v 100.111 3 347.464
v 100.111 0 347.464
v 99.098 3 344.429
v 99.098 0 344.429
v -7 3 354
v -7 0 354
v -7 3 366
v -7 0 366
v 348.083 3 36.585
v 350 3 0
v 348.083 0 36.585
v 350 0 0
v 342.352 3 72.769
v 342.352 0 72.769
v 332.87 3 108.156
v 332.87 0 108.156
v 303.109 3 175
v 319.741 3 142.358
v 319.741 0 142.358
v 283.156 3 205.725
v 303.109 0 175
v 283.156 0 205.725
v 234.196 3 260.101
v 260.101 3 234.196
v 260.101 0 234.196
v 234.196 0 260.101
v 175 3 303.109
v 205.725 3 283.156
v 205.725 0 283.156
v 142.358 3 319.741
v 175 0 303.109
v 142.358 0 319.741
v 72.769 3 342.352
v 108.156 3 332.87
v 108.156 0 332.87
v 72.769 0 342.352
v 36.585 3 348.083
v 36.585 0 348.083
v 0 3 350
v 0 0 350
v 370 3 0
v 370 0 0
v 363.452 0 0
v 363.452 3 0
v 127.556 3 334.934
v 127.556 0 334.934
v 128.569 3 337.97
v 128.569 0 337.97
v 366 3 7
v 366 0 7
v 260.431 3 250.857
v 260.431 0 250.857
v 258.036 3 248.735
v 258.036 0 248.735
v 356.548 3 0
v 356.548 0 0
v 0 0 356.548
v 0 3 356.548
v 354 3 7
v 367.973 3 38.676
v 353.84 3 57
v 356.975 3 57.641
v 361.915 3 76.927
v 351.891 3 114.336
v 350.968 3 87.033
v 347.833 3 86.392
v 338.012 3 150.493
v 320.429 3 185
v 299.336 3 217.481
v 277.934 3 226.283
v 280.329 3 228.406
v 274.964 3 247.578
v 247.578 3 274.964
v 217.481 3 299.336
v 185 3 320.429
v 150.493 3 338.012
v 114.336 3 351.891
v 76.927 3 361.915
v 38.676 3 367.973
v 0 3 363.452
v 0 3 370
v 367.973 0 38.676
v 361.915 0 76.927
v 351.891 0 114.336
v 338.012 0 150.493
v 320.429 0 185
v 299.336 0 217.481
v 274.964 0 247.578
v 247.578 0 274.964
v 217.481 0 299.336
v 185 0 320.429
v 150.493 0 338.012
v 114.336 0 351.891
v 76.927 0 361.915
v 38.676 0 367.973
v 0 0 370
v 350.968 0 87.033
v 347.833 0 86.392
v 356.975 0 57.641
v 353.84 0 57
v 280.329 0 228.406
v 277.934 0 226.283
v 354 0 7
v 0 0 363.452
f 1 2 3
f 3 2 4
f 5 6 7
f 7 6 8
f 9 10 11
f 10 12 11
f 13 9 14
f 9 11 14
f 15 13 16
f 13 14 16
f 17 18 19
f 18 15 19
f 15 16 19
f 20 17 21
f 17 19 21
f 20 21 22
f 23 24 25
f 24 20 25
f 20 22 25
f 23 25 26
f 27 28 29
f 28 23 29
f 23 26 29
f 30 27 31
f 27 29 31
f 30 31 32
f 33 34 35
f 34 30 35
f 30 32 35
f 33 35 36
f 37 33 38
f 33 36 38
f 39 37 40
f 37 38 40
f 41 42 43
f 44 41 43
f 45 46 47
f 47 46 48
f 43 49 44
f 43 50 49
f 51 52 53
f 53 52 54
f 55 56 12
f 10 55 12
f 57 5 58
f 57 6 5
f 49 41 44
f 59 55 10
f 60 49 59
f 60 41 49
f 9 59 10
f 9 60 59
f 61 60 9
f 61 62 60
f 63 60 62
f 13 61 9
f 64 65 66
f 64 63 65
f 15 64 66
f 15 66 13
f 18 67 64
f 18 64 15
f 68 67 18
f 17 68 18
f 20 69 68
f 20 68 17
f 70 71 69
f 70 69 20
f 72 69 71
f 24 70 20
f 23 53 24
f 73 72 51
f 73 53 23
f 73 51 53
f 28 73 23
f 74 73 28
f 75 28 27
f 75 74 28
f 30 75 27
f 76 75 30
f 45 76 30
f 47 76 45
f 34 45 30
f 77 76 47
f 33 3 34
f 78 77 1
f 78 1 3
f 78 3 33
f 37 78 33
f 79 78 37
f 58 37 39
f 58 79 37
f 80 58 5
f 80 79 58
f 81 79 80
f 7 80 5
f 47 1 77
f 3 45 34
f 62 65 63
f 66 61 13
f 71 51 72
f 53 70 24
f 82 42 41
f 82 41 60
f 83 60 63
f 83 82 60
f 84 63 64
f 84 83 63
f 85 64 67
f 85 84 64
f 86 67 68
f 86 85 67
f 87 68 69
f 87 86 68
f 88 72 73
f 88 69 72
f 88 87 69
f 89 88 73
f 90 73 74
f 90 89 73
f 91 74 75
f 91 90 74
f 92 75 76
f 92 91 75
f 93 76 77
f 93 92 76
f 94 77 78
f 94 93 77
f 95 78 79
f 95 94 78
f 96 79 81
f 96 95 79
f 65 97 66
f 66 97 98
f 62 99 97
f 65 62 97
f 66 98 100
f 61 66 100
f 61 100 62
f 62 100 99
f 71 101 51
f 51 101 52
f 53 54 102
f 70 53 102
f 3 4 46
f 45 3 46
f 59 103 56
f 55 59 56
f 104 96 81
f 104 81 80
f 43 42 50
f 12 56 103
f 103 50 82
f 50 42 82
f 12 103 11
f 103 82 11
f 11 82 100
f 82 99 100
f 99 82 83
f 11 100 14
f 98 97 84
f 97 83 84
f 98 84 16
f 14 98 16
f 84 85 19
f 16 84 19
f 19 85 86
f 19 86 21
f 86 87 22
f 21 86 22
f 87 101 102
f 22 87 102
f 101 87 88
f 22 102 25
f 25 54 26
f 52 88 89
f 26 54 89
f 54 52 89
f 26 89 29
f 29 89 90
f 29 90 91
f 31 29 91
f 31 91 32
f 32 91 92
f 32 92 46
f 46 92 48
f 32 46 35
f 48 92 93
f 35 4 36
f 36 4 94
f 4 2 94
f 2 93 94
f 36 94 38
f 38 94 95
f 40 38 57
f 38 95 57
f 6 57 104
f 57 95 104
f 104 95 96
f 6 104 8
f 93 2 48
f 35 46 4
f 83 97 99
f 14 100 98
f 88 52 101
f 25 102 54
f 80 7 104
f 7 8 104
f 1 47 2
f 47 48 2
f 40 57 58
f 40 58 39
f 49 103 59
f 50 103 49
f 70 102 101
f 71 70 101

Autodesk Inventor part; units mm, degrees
ref_plane "YZ Plane" through (0, 0, 0) normal (1, 0, 0) x (0, 1, 0)
ref_plane "XZ Plane" through (0, 0, 0) normal (0, 1, 0) x (-1, 0, 0)
ref_plane "XY Plane" through (0, 0, 0) normal (0, 0, 1) x (1, 0, 0)
sketch "Sketch1" plane through (0, 0, 0) normal (0, 1, 0) x (-1, 0, 0)
  circle A0 centre (0, 0) radius 350
  circle A1 centre (0, 0) radius 370
  line L0 (370, 0) -> (350, 0)
  line L1 (-370, 0) -> (-350, 0)
  line L2 (0, 0) -> (-350, 0) construction
  line L3 (0, 350) -> (0, 0) construction
  line L4 (0, 370) -> (0, 350)
  line L5 (-350, 0) -> (-370, 0)
  line L6 (-354, 7) -> (-366, 7)
  line L7 (-366, 7) -> (-363.4522, 0)
  line L8 (-354, 7) -> (-356.5478, 0)
  line L9 (-360, 0) -> (-360, 7) construction
  line L10 (-356.9749, 57.6407) -> (-350.9683, 87.0332)
  line L11 (-350.9683, 87.0332) -> (-347.8331, 86.3925)
  line L12 (-347.8331, 86.3925) -> (-353.8397, 57)
  line L13 (-353.8397, 57) -> (-356.9749, 57.6407)
  line L14 (-356.9749, 57.6407) -> (-347.8331, 86.3925) construction
  line L15 (-350.9683, 87.0332) -> (-353.8397, 57) construction
  circle A2 centre (0, 0) radius 360 construction
  line L16 (-7, -354) -> (0, -356.5478)
  line L17 (-7, -366) -> (0, -363.4522)
  line L18 (-7, -354) -> (-7, -366)
  line L19 (354, -7) -> (356.5478, 0)
  line L20 (366, -7) -> (363.4522, 0)
  line L21 (354, -7) -> (366, -7)
  line L22 (7, 354) -> (0, 356.5478)
  line L23 (7, 366) -> (0, 363.4522)
  line L24 (7, 354) -> (7, 366)
  line L25 (-337.9697, -128.5692) -> (-347.4641, -100.1112)
  line L26 (-334.9342, -127.5564) -> (-337.9697, -128.5692)
  line L27 (-344.4286, -99.0984) -> (-334.9342, -127.5564)
  line L28 (-347.4641, -100.1112) -> (-344.4286, -99.0984)
  line L29 (-228.4058, -280.329) -> (-250.8572, -260.4309)
  line L30 (-226.2833, -277.9342) -> (-228.4058, -280.329)
  line L31 (-248.7347, -258.0361) -> (-226.2833, -277.9342)
  line L32 (-250.8572, -260.4309) -> (-248.7347, -258.0361)
  line L33 (-57.6407, -356.9749) -> (-87.0332, -350.9683)
  line L34 (-57, -353.8397) -> (-57.6407, -356.9749)
  line L35 (-86.3925, -347.8331) -> (-57, -353.8397)
  line L36 (-87.0332, -350.9683) -> (-86.3925, -347.8331)
  line L37 (128.5692, -337.9697) -> (100.1112, -347.4641)
  line L38 (127.5564, -334.9342) -> (128.5692, -337.9697)
  line L39 (99.0984, -344.4286) -> (127.5564, -334.9342)
  line L40 (100.1112, -347.4641) -> (99.0984, -344.4286)
  line L41 (280.329, -228.4058) -> (260.4309, -250.8572)
  line L42 (277.9342, -226.2833) -> (280.329, -228.4058)
  line L43 (258.0361, -248.7347) -> (277.9342, -226.2833)
  line L44 (260.4309, -250.8572) -> (258.0361, -248.7347)
  line L45 (356.9749, -57.6407) -> (350.9683, -87.0332)
  line L46 (353.8397, -57) -> (356.9749, -57.6407)
  line L47 (347.8331, -86.3925) -> (353.8397, -57)
  line L48 (350.9683, -87.0332) -> (347.8331, -86.3925)
  line L49 (337.9697, 128.5692) -> (347.4641, 100.1112)
  line L50 (334.9342, 127.5564) -> (337.9697, 128.5692)
  line L51 (344.4286, 99.0984) -> (334.9342, 127.5564)
  line L52 (347.4641, 100.1112) -> (344.4286, 99.0984)
  line L53 (228.4058, 280.329) -> (250.8572, 260.4309)
  line L54 (226.2833, 277.9342) -> (228.4058, 280.329)
  line L55 (248.7347, 258.0361) -> (226.2833, 277.9342)
  line L56 (250.8572, 260.4309) -> (248.7347, 258.0361)
  line L57 (57.6407, 356.9749) -> (87.0332, 350.9683)
  line L58 (57, 353.8397) -> (57.6407, 356.9749)
  line L59 (86.3925, 347.8331) -> (57, 353.8397)
  line L60 (87.0332, 350.9683) -> (86.3925, 347.8331)
  line L61 (-128.5692, 337.9697) -> (-100.1112, 347.4641)
  line L62 (-127.5564, 334.9342) -> (-128.5692, 337.9697)
  line L63 (-99.0984, 344.4286) -> (-127.5564, 334.9342)
  line L64 (-100.1112, 347.4641) -> (-99.0984, 344.4286)
  line L65 (-280.329, 228.4058) -> (-260.4309, 250.8572)
  line L66 (-277.9342, 226.2833) -> (-280.329, 228.4058)
  line L67 (-258.0361, 248.7347) -> (-277.9342, 226.2833)
  line L68 (-260.4309, 250.8572) -> (-258.0361, 248.7347)
  point P0 (360, 0)
  point P1 (-360, 0)
  point P2 (-352.404, 72.0166)
  point P3 (-68.8261, 353.3595)
  point P4 (-355.4073, 57.3204)
  point P5 (-349.4007, 86.7129)
  point P6 (-7, -360)
  point P7 (360, -7)
  point P8 (7, 360)
  point P9 (-336.452, -128.0628)
  point P10 (-345.9464, -99.6048)
  point P11 (-227.3446, -279.1316)
  point P12 (-249.7959, -259.2335)
  point P13 (-57.3204, -355.4073)
  point P14 (-86.7129, -349.4007)
  point P15 (128.0628, -336.452)
  point P16 (99.6048, -345.9464)
  point P17 (279.1316, -227.3446)
  point P18 (259.2335, -249.7959)
  point P19 (355.4073, -57.3204)
  point P20 (349.4007, -86.7129)
  point P21 (336.452, 128.0628)
  point P22 (345.9464, 99.6048)
  point P23 (227.3446, 279.1316)
  point P24 (249.7959, 259.2335)
  point P25 (57.3204, 355.4073)
  point P26 (86.7129, 349.4007)
  point P27 (-128.0628, 336.452)
  point P28 (-99.6048, 345.9464)
  point P29 (-279.1316, 227.3446)
  point P30 (-259.2335, 249.7959)
  point P31 (0, 356.5478)
  point P32 (0, 363.4522)
  dimension "d0" = 700
  dimension "d1" = 740
  dimension "d4" = 90
  dimension "d5" = 7
  dimension "d6" = 70
  dimension "d8" = 12
  dimension "d13" = 3.2
  dimension "d14" = 30
  dimension "d15" = 50
  dimension "d20" = 720
  dimension "d23" = 360
  dimension "d27" = 360
extrude "Extrusion1" add sketch "Sketch1" along normal blind 3 contours A0 L1 L8 L6 L7 A1 L4 | L4 L23 L24 L22
properties part number "R70_CM_CIRCULO"
